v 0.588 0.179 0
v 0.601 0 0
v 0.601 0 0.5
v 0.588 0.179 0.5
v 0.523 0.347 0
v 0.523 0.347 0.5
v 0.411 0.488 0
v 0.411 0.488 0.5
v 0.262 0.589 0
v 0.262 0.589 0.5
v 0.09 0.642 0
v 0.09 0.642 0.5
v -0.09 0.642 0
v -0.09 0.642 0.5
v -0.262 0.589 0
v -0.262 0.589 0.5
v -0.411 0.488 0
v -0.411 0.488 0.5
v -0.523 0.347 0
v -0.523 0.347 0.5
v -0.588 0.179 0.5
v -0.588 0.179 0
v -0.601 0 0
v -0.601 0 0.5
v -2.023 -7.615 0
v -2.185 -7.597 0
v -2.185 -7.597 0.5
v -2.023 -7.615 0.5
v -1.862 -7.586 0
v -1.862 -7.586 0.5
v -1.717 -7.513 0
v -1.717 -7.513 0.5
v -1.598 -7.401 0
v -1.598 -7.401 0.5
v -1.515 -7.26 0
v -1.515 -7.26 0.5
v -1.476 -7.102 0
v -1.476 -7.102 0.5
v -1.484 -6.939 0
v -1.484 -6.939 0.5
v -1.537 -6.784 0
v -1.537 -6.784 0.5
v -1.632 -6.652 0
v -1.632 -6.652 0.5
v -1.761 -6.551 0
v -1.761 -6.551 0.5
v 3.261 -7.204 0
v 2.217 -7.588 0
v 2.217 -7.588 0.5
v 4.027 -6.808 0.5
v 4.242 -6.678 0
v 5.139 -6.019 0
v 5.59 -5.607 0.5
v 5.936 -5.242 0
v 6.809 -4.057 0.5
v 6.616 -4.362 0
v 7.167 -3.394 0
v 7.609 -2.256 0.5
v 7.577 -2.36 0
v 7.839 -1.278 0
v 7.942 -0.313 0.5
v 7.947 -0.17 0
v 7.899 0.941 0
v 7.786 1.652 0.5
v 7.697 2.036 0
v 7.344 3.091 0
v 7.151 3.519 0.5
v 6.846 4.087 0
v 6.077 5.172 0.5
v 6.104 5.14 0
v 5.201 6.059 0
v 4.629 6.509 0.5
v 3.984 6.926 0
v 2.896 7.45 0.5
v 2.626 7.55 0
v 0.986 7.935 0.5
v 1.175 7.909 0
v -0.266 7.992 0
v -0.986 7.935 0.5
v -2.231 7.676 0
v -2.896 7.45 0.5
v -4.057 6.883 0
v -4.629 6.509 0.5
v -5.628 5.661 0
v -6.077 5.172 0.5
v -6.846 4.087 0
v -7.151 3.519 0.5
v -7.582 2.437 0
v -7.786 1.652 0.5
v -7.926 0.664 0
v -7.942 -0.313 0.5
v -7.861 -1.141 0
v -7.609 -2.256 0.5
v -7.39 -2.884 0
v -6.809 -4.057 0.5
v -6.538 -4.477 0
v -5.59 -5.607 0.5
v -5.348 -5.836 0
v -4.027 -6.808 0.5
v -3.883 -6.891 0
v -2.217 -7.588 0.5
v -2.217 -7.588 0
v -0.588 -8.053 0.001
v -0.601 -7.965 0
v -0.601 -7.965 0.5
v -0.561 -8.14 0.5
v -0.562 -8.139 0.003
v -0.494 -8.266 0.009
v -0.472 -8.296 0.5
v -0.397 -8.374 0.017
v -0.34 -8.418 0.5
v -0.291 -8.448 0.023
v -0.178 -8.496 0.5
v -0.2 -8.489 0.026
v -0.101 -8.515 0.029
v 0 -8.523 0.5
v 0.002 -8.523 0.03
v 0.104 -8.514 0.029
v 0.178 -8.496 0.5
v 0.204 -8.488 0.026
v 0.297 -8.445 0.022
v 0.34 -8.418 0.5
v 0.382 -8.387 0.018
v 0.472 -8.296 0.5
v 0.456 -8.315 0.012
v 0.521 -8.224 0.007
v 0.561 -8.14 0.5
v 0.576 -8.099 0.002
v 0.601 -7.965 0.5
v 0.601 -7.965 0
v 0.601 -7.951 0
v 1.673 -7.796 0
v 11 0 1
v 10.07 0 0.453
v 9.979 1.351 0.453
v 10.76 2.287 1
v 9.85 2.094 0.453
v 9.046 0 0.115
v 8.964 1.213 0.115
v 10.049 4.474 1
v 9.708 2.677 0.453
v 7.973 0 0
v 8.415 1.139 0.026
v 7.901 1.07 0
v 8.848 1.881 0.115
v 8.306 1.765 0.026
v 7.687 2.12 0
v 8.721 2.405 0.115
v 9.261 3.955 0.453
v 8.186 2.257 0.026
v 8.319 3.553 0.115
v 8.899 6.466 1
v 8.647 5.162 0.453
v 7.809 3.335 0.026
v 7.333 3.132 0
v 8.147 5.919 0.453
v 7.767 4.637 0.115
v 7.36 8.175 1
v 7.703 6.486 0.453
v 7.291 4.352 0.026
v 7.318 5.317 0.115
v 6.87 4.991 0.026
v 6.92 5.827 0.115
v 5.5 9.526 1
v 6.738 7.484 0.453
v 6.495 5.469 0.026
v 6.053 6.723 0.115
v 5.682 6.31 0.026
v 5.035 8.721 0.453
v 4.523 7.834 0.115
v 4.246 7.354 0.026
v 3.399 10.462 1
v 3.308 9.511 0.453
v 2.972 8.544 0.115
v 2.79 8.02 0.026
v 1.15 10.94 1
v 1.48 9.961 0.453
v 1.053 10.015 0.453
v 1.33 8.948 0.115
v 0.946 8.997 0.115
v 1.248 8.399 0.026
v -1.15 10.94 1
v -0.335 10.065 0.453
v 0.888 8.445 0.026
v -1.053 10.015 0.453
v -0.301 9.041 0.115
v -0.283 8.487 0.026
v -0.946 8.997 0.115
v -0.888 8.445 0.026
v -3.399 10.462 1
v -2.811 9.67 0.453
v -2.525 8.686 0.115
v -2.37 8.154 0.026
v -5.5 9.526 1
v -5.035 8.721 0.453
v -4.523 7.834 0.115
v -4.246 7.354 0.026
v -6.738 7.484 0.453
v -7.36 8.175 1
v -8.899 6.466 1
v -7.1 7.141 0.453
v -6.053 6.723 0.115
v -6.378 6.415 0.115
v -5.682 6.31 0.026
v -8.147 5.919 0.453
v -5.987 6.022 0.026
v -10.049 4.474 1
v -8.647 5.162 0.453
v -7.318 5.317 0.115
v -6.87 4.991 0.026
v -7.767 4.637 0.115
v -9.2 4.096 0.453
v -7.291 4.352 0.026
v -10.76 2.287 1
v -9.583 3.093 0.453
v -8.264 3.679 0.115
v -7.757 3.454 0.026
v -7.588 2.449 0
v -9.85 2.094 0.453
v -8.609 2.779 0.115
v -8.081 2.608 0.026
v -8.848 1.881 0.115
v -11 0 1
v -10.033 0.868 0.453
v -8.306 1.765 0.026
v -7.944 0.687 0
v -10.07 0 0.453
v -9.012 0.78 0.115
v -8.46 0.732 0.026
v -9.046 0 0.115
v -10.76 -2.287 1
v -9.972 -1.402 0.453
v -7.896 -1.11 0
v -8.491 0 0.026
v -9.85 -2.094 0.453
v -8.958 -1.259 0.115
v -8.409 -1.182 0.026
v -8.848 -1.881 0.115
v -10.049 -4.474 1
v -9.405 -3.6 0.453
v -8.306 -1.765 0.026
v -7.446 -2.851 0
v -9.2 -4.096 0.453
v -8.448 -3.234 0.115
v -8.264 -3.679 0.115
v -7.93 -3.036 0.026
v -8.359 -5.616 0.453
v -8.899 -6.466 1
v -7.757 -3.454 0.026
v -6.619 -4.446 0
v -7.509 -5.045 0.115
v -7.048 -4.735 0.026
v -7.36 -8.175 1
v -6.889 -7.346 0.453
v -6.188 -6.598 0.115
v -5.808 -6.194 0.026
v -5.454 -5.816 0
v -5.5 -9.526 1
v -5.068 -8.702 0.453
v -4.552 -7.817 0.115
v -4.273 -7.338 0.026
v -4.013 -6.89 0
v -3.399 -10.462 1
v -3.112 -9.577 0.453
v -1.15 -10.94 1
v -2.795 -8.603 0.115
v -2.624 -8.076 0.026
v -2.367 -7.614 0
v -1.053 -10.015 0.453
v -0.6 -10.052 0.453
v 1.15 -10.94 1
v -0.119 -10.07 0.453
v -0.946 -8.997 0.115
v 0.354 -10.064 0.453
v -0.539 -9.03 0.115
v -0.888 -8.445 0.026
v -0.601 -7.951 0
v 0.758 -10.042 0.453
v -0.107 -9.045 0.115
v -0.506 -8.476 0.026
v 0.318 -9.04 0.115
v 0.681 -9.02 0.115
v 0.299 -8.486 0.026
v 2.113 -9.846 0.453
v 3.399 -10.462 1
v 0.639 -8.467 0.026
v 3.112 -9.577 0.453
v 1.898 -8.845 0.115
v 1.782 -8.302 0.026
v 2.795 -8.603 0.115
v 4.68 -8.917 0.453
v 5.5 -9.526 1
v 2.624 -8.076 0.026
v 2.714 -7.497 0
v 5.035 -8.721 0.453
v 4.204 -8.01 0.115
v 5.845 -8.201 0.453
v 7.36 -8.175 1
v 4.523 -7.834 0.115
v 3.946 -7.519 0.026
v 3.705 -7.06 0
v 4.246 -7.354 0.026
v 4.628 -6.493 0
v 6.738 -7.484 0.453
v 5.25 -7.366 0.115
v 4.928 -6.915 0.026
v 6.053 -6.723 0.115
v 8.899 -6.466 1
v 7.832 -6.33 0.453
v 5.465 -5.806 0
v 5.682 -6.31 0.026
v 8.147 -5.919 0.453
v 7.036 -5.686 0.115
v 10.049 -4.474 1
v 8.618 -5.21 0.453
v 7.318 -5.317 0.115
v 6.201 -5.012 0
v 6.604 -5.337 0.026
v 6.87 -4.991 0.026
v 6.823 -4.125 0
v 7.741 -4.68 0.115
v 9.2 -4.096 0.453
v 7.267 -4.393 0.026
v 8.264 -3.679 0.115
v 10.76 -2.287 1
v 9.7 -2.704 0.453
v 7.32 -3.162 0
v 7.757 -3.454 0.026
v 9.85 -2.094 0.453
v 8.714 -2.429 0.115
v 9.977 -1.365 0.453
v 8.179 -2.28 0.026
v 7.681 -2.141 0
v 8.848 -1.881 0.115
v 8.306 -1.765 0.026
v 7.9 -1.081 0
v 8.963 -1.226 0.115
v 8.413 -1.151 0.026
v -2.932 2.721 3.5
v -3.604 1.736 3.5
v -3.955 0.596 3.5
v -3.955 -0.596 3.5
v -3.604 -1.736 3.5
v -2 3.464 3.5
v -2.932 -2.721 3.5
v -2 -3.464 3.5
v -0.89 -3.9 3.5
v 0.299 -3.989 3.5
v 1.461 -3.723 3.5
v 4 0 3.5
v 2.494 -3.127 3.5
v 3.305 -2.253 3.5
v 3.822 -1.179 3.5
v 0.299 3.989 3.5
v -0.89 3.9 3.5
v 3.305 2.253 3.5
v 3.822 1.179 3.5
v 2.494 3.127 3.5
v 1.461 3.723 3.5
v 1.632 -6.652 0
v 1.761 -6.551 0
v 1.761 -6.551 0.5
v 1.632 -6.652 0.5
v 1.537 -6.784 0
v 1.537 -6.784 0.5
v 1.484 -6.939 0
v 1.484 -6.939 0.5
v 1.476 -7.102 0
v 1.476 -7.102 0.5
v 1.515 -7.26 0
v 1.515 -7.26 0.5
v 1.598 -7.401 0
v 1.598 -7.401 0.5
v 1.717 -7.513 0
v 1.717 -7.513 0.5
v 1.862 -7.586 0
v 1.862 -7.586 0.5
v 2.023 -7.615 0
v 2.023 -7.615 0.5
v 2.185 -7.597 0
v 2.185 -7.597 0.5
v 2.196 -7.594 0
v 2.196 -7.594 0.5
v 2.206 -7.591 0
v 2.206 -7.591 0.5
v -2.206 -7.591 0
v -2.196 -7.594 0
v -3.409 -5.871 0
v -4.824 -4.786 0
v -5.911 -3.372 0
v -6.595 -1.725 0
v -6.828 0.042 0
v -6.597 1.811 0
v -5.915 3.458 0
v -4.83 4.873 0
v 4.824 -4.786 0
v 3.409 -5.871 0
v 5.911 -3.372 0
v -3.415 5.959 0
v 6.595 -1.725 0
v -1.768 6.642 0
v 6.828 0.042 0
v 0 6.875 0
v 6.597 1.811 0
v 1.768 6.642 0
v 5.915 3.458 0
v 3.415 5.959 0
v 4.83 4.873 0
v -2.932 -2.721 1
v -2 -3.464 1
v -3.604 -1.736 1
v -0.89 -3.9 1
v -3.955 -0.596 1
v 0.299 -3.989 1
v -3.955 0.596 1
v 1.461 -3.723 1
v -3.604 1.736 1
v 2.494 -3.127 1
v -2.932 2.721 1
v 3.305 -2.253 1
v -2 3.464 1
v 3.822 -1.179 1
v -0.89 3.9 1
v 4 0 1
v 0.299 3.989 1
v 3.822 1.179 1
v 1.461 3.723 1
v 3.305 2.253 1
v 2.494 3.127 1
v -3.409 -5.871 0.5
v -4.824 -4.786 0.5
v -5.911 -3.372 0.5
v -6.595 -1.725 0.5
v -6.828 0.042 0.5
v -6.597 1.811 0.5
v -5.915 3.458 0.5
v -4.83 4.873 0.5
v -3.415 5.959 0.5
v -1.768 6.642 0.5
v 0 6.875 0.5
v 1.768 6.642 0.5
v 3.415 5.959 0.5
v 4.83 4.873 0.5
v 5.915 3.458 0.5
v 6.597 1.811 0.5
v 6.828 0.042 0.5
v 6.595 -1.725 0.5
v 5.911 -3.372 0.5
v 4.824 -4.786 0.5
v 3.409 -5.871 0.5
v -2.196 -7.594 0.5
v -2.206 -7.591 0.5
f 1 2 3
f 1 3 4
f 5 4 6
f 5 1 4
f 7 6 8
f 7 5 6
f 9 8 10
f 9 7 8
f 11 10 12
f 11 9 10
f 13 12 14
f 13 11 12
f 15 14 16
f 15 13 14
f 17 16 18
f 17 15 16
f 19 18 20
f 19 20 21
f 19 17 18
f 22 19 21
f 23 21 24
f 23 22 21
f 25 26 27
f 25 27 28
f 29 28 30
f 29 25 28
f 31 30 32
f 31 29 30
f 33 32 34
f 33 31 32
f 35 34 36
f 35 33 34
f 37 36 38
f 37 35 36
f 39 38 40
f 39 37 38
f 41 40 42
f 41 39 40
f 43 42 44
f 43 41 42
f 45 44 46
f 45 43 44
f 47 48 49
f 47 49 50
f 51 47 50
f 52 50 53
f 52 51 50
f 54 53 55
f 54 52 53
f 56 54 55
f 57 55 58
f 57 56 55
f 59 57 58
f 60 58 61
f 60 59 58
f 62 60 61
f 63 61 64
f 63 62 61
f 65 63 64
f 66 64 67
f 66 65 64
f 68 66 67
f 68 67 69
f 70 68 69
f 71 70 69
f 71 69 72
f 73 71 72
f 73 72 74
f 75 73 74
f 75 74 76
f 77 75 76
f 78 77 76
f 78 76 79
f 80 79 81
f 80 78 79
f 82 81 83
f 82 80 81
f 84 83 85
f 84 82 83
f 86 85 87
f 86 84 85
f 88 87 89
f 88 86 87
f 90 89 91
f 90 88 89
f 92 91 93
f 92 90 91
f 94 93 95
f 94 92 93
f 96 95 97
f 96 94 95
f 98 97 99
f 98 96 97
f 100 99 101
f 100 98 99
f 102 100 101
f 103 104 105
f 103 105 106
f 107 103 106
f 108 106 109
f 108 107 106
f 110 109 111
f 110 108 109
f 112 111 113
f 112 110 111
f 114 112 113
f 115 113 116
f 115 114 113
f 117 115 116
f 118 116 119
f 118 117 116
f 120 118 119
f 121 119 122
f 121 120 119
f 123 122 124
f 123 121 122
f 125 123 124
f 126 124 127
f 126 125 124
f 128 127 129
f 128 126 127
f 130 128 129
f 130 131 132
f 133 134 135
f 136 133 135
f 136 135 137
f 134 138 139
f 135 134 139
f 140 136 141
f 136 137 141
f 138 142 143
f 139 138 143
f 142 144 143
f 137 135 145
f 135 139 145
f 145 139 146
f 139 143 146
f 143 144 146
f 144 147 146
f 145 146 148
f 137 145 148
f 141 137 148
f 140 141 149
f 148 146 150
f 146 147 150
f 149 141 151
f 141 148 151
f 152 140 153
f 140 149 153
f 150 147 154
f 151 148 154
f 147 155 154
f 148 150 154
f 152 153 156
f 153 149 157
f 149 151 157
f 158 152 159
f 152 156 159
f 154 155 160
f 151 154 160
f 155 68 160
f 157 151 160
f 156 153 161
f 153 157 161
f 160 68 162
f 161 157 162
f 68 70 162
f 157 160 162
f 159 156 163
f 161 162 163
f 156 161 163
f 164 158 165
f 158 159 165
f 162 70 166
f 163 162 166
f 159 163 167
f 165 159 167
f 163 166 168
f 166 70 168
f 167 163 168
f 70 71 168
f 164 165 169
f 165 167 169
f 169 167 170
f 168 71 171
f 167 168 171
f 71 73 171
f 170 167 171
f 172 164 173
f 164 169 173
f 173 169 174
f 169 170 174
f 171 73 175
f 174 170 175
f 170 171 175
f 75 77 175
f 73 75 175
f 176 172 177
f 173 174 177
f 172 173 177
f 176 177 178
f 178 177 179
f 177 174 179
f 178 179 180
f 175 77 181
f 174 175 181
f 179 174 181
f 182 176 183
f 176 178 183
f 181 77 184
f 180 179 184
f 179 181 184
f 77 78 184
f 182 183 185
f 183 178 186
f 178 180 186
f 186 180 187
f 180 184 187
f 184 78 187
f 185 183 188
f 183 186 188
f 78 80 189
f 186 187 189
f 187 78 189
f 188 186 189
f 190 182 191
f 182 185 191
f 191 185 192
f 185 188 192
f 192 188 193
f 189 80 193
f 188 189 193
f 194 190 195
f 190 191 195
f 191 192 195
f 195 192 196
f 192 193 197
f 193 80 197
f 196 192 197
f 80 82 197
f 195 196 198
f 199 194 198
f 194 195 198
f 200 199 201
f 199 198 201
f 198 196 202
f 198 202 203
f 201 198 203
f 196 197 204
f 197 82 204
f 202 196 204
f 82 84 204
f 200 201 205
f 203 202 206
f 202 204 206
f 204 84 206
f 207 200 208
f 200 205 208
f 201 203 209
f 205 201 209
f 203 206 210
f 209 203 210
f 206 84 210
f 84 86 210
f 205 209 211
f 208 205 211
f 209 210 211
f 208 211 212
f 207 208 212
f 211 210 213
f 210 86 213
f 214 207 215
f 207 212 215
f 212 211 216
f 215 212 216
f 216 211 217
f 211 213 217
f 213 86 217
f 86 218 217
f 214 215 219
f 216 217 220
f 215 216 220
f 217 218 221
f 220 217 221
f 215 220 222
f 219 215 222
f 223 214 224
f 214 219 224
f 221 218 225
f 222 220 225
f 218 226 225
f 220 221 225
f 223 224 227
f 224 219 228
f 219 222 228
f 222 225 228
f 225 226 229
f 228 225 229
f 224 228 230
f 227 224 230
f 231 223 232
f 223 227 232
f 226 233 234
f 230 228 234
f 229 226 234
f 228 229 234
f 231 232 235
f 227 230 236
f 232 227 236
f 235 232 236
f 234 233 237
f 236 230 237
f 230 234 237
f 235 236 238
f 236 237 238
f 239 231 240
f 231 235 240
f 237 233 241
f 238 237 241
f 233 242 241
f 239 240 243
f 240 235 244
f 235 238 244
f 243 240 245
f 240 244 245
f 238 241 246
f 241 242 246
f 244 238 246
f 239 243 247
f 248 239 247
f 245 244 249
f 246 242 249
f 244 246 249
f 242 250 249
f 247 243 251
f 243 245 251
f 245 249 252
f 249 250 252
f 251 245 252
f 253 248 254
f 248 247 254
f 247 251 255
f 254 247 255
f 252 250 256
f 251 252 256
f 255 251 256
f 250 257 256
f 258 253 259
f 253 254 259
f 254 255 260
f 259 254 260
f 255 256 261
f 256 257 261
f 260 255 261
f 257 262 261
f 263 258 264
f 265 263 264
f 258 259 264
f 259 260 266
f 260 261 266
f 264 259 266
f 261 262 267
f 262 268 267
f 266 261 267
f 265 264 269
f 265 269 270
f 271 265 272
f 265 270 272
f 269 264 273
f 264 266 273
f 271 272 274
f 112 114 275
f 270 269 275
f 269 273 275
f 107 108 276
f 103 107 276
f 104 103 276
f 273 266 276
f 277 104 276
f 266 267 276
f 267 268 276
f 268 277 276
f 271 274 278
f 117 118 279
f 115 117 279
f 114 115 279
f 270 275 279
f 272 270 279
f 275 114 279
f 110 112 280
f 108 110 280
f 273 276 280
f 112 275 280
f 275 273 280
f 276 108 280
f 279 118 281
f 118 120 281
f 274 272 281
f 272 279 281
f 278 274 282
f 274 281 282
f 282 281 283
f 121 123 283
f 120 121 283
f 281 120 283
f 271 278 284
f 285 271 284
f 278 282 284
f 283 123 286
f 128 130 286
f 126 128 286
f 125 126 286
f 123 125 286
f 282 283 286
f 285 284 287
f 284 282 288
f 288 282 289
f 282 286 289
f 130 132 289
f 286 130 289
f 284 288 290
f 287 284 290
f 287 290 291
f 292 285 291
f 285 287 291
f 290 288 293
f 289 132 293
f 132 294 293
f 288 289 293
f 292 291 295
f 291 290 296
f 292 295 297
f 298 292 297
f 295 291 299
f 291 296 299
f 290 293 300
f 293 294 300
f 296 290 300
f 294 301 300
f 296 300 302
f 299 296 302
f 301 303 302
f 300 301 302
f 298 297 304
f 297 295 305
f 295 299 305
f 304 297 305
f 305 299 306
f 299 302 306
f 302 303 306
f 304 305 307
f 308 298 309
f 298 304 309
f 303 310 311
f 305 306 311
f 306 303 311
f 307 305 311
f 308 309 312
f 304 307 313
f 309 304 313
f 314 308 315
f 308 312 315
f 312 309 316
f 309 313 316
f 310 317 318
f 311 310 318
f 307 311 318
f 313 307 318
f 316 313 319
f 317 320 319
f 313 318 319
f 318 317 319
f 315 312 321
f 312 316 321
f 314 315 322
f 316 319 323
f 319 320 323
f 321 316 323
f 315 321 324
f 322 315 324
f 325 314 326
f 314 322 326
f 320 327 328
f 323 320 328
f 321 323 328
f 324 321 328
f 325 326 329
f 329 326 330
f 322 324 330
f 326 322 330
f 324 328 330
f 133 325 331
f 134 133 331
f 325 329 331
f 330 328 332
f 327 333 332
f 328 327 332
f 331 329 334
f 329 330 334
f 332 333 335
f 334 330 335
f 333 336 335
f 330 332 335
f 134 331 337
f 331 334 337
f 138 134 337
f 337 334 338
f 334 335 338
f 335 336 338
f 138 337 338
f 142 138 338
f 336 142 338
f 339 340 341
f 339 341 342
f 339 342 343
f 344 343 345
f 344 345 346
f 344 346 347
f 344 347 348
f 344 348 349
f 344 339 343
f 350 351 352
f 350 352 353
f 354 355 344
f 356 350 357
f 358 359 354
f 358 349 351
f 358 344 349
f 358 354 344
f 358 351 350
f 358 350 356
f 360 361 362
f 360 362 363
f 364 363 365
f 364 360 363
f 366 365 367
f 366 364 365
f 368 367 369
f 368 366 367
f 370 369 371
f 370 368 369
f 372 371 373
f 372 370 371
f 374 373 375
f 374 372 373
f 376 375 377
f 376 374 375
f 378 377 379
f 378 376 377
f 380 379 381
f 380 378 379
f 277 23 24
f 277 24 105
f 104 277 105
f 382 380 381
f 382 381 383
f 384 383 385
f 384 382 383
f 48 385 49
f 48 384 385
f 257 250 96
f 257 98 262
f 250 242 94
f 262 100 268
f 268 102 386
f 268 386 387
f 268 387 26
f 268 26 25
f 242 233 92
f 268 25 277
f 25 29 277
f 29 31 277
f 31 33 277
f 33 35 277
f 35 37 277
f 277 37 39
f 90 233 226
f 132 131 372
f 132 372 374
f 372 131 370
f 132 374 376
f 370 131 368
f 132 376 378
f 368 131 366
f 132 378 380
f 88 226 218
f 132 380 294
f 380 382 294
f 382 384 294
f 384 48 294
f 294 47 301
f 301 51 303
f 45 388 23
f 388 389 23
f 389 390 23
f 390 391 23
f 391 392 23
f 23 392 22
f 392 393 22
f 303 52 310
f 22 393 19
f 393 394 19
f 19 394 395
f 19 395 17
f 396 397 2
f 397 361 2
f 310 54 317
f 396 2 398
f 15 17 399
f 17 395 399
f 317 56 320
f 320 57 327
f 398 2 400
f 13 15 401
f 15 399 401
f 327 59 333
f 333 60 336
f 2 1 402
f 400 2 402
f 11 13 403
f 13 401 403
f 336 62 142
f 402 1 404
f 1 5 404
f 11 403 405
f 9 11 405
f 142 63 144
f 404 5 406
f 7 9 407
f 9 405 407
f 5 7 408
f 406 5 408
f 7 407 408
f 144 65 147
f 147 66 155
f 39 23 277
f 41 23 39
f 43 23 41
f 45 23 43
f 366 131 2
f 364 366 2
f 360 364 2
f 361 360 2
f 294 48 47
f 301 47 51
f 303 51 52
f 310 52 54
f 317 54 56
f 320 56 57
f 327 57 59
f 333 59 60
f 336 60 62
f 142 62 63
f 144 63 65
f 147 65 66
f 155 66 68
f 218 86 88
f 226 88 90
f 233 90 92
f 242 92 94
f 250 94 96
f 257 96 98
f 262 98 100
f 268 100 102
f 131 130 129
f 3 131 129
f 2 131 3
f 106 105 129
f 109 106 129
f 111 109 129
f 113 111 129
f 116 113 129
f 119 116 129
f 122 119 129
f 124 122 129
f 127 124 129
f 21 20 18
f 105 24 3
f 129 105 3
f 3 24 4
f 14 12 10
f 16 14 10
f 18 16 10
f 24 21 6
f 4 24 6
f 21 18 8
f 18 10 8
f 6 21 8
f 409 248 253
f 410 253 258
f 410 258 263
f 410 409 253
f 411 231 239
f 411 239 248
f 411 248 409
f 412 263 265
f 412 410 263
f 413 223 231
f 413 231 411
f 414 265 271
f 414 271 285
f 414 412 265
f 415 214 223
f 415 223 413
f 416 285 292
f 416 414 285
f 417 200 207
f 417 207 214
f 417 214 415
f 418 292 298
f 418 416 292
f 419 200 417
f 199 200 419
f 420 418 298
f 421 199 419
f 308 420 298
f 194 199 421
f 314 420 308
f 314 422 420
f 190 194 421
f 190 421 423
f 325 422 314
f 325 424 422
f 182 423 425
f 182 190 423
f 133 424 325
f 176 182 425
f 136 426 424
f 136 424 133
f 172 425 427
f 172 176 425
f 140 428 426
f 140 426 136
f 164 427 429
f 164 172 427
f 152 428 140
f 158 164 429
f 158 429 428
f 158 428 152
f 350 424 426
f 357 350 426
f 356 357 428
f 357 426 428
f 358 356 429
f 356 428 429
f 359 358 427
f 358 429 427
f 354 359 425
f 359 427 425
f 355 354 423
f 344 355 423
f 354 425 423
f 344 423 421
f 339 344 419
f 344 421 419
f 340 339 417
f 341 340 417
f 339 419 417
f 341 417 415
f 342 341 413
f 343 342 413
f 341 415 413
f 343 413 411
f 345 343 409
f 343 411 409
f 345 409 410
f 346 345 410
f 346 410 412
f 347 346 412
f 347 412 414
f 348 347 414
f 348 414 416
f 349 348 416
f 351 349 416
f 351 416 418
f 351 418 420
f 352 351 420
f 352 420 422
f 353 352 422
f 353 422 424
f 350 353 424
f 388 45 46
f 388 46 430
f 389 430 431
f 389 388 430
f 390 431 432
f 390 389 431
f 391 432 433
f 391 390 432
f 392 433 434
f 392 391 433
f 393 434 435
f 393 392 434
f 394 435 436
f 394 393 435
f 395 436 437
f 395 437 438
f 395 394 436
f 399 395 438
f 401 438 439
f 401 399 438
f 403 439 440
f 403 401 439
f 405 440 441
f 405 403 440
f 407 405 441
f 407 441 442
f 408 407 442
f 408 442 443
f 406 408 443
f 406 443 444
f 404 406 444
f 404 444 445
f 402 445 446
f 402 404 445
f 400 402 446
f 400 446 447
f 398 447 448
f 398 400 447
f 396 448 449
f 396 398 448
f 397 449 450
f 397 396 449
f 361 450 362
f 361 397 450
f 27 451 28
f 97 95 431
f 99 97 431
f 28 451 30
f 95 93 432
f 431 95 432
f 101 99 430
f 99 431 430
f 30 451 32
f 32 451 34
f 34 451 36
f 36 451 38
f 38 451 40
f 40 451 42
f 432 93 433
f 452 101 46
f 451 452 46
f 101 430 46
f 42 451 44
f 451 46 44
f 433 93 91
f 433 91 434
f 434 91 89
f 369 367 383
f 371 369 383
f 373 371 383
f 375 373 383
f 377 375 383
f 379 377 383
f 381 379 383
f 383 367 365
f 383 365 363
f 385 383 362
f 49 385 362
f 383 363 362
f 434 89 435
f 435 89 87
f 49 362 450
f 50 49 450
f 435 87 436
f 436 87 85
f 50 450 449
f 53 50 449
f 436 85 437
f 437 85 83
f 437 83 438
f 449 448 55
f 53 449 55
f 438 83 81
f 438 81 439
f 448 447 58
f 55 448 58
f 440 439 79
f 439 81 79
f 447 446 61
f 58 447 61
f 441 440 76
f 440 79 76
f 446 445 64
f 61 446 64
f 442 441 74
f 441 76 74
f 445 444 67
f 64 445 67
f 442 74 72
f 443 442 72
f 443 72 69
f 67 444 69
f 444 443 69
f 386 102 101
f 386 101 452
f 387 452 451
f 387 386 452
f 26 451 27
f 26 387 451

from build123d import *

# Parameters (mm, degrees)
F0_R     = 4
F1_DEPTH = 3.5
F0_R_2   = 11
F2_DEPTH = 1
F4_DEPTH = 0.5


# Not quite as in the source:
# - a fillet or chamfer that OpenCascade refuses, or shapes differently, is made with other operations: its cross-section is extruded or revolved along the edge and cut away or added


with BuildPart() as f1:
    # F0 (on Top) → F1 (new body)
    with BuildSketch(Plane.XY):
        Circle(F0_R)
    extrude(amount=F1_DEPTH)

    # F0 (on Top) → F2 (join)
    with BuildSketch(Plane.XY):
        Circle(F0_R_2)
        Circle(F0_R, mode=Mode.SUBTRACT)
    extrude(amount=F2_DEPTH)

    # F3 (on face) → F4 (cut)
    with BuildSketch(Plane.XY):
        with BuildLine():
            Line((-0.6011938094, -3.9545626817), (-0.6011938094, -7.9646864906))
            ThreePointArc((-0.6011938094, -7.9646864906), (0, -8.523200555), (0.6011938094, -7.9646864906))
            Line((0.6011938094, -7.9646864906), (0.6011938094, -3.9545626817))
            ThreePointArc((0.6011938094, -3.9545626817), (0, -4), (-0.6011938094, -3.9545626817))
        make_face()
        with BuildLine():
            Line((-0.6011938094, 0), (-0.6011938094, -3.9545626817))
            ThreePointArc((-0.6011938094, -3.9545626817), (0, -4), (0.6011938094, -3.9545626817))
            Line((0.6011938094, -3.9545626817), (0.6011938094, 0))
            ThreePointArc((0.6011938094, 0), (0, 0.6491973737), (-0.6011938094, 0))
        make_face()
        with BuildLine():
            ThreePointArc((-1.7606344773, -6.5513337031), (0, 6.8746740692), (1.7606344773, -6.5513337031))
            ThreePointArc((1.7606344773, -6.5513337031), (1.5154543616, -7.2599851451), (2.1851049368, -7.5974288625))
            ThreePointArc((2.1851049368, -7.5974288625), (2.2008228493, -7.5929180655), (2.21653145, -7.5883749472))
            ThreePointArc((2.21653145, -7.5883749472), (0, 7.9960832706), (-2.21653145, -7.5883749472))
            ThreePointArc((-2.21653145, -7.5883749472), (-2.2008228493, -7.5929180655), (-2.1851049368, -7.5974288625))
            ThreePointArc((-2.1851049368, -7.5974288625), (-1.5154543616, -7.2599851451), (-1.7606344773, -6.5513337031))
        make_face()
    extrude(amount=F4_DEPTH, mode=Mode.SUBTRACT)

    # F5: fillet of radius 5.08 on 1 edges, made by hand

    # F5_s1 → F5_t2 (revolve, cut)
    with BuildSketch(Plane.XZ):
        with BuildLine():
            ThreePointArc((11, 1), (9.567188555, 0.2564743185), (7.9734508099, 0))
            Line((7.9734508099, 0), (11, 0))
            Line((11, 0), (11, 1))
        make_face()
    revolve(axis=Axis((0, 0, 0), (0, 0, 1)), mode=Mode.SUBTRACT)


solid = f1.part
